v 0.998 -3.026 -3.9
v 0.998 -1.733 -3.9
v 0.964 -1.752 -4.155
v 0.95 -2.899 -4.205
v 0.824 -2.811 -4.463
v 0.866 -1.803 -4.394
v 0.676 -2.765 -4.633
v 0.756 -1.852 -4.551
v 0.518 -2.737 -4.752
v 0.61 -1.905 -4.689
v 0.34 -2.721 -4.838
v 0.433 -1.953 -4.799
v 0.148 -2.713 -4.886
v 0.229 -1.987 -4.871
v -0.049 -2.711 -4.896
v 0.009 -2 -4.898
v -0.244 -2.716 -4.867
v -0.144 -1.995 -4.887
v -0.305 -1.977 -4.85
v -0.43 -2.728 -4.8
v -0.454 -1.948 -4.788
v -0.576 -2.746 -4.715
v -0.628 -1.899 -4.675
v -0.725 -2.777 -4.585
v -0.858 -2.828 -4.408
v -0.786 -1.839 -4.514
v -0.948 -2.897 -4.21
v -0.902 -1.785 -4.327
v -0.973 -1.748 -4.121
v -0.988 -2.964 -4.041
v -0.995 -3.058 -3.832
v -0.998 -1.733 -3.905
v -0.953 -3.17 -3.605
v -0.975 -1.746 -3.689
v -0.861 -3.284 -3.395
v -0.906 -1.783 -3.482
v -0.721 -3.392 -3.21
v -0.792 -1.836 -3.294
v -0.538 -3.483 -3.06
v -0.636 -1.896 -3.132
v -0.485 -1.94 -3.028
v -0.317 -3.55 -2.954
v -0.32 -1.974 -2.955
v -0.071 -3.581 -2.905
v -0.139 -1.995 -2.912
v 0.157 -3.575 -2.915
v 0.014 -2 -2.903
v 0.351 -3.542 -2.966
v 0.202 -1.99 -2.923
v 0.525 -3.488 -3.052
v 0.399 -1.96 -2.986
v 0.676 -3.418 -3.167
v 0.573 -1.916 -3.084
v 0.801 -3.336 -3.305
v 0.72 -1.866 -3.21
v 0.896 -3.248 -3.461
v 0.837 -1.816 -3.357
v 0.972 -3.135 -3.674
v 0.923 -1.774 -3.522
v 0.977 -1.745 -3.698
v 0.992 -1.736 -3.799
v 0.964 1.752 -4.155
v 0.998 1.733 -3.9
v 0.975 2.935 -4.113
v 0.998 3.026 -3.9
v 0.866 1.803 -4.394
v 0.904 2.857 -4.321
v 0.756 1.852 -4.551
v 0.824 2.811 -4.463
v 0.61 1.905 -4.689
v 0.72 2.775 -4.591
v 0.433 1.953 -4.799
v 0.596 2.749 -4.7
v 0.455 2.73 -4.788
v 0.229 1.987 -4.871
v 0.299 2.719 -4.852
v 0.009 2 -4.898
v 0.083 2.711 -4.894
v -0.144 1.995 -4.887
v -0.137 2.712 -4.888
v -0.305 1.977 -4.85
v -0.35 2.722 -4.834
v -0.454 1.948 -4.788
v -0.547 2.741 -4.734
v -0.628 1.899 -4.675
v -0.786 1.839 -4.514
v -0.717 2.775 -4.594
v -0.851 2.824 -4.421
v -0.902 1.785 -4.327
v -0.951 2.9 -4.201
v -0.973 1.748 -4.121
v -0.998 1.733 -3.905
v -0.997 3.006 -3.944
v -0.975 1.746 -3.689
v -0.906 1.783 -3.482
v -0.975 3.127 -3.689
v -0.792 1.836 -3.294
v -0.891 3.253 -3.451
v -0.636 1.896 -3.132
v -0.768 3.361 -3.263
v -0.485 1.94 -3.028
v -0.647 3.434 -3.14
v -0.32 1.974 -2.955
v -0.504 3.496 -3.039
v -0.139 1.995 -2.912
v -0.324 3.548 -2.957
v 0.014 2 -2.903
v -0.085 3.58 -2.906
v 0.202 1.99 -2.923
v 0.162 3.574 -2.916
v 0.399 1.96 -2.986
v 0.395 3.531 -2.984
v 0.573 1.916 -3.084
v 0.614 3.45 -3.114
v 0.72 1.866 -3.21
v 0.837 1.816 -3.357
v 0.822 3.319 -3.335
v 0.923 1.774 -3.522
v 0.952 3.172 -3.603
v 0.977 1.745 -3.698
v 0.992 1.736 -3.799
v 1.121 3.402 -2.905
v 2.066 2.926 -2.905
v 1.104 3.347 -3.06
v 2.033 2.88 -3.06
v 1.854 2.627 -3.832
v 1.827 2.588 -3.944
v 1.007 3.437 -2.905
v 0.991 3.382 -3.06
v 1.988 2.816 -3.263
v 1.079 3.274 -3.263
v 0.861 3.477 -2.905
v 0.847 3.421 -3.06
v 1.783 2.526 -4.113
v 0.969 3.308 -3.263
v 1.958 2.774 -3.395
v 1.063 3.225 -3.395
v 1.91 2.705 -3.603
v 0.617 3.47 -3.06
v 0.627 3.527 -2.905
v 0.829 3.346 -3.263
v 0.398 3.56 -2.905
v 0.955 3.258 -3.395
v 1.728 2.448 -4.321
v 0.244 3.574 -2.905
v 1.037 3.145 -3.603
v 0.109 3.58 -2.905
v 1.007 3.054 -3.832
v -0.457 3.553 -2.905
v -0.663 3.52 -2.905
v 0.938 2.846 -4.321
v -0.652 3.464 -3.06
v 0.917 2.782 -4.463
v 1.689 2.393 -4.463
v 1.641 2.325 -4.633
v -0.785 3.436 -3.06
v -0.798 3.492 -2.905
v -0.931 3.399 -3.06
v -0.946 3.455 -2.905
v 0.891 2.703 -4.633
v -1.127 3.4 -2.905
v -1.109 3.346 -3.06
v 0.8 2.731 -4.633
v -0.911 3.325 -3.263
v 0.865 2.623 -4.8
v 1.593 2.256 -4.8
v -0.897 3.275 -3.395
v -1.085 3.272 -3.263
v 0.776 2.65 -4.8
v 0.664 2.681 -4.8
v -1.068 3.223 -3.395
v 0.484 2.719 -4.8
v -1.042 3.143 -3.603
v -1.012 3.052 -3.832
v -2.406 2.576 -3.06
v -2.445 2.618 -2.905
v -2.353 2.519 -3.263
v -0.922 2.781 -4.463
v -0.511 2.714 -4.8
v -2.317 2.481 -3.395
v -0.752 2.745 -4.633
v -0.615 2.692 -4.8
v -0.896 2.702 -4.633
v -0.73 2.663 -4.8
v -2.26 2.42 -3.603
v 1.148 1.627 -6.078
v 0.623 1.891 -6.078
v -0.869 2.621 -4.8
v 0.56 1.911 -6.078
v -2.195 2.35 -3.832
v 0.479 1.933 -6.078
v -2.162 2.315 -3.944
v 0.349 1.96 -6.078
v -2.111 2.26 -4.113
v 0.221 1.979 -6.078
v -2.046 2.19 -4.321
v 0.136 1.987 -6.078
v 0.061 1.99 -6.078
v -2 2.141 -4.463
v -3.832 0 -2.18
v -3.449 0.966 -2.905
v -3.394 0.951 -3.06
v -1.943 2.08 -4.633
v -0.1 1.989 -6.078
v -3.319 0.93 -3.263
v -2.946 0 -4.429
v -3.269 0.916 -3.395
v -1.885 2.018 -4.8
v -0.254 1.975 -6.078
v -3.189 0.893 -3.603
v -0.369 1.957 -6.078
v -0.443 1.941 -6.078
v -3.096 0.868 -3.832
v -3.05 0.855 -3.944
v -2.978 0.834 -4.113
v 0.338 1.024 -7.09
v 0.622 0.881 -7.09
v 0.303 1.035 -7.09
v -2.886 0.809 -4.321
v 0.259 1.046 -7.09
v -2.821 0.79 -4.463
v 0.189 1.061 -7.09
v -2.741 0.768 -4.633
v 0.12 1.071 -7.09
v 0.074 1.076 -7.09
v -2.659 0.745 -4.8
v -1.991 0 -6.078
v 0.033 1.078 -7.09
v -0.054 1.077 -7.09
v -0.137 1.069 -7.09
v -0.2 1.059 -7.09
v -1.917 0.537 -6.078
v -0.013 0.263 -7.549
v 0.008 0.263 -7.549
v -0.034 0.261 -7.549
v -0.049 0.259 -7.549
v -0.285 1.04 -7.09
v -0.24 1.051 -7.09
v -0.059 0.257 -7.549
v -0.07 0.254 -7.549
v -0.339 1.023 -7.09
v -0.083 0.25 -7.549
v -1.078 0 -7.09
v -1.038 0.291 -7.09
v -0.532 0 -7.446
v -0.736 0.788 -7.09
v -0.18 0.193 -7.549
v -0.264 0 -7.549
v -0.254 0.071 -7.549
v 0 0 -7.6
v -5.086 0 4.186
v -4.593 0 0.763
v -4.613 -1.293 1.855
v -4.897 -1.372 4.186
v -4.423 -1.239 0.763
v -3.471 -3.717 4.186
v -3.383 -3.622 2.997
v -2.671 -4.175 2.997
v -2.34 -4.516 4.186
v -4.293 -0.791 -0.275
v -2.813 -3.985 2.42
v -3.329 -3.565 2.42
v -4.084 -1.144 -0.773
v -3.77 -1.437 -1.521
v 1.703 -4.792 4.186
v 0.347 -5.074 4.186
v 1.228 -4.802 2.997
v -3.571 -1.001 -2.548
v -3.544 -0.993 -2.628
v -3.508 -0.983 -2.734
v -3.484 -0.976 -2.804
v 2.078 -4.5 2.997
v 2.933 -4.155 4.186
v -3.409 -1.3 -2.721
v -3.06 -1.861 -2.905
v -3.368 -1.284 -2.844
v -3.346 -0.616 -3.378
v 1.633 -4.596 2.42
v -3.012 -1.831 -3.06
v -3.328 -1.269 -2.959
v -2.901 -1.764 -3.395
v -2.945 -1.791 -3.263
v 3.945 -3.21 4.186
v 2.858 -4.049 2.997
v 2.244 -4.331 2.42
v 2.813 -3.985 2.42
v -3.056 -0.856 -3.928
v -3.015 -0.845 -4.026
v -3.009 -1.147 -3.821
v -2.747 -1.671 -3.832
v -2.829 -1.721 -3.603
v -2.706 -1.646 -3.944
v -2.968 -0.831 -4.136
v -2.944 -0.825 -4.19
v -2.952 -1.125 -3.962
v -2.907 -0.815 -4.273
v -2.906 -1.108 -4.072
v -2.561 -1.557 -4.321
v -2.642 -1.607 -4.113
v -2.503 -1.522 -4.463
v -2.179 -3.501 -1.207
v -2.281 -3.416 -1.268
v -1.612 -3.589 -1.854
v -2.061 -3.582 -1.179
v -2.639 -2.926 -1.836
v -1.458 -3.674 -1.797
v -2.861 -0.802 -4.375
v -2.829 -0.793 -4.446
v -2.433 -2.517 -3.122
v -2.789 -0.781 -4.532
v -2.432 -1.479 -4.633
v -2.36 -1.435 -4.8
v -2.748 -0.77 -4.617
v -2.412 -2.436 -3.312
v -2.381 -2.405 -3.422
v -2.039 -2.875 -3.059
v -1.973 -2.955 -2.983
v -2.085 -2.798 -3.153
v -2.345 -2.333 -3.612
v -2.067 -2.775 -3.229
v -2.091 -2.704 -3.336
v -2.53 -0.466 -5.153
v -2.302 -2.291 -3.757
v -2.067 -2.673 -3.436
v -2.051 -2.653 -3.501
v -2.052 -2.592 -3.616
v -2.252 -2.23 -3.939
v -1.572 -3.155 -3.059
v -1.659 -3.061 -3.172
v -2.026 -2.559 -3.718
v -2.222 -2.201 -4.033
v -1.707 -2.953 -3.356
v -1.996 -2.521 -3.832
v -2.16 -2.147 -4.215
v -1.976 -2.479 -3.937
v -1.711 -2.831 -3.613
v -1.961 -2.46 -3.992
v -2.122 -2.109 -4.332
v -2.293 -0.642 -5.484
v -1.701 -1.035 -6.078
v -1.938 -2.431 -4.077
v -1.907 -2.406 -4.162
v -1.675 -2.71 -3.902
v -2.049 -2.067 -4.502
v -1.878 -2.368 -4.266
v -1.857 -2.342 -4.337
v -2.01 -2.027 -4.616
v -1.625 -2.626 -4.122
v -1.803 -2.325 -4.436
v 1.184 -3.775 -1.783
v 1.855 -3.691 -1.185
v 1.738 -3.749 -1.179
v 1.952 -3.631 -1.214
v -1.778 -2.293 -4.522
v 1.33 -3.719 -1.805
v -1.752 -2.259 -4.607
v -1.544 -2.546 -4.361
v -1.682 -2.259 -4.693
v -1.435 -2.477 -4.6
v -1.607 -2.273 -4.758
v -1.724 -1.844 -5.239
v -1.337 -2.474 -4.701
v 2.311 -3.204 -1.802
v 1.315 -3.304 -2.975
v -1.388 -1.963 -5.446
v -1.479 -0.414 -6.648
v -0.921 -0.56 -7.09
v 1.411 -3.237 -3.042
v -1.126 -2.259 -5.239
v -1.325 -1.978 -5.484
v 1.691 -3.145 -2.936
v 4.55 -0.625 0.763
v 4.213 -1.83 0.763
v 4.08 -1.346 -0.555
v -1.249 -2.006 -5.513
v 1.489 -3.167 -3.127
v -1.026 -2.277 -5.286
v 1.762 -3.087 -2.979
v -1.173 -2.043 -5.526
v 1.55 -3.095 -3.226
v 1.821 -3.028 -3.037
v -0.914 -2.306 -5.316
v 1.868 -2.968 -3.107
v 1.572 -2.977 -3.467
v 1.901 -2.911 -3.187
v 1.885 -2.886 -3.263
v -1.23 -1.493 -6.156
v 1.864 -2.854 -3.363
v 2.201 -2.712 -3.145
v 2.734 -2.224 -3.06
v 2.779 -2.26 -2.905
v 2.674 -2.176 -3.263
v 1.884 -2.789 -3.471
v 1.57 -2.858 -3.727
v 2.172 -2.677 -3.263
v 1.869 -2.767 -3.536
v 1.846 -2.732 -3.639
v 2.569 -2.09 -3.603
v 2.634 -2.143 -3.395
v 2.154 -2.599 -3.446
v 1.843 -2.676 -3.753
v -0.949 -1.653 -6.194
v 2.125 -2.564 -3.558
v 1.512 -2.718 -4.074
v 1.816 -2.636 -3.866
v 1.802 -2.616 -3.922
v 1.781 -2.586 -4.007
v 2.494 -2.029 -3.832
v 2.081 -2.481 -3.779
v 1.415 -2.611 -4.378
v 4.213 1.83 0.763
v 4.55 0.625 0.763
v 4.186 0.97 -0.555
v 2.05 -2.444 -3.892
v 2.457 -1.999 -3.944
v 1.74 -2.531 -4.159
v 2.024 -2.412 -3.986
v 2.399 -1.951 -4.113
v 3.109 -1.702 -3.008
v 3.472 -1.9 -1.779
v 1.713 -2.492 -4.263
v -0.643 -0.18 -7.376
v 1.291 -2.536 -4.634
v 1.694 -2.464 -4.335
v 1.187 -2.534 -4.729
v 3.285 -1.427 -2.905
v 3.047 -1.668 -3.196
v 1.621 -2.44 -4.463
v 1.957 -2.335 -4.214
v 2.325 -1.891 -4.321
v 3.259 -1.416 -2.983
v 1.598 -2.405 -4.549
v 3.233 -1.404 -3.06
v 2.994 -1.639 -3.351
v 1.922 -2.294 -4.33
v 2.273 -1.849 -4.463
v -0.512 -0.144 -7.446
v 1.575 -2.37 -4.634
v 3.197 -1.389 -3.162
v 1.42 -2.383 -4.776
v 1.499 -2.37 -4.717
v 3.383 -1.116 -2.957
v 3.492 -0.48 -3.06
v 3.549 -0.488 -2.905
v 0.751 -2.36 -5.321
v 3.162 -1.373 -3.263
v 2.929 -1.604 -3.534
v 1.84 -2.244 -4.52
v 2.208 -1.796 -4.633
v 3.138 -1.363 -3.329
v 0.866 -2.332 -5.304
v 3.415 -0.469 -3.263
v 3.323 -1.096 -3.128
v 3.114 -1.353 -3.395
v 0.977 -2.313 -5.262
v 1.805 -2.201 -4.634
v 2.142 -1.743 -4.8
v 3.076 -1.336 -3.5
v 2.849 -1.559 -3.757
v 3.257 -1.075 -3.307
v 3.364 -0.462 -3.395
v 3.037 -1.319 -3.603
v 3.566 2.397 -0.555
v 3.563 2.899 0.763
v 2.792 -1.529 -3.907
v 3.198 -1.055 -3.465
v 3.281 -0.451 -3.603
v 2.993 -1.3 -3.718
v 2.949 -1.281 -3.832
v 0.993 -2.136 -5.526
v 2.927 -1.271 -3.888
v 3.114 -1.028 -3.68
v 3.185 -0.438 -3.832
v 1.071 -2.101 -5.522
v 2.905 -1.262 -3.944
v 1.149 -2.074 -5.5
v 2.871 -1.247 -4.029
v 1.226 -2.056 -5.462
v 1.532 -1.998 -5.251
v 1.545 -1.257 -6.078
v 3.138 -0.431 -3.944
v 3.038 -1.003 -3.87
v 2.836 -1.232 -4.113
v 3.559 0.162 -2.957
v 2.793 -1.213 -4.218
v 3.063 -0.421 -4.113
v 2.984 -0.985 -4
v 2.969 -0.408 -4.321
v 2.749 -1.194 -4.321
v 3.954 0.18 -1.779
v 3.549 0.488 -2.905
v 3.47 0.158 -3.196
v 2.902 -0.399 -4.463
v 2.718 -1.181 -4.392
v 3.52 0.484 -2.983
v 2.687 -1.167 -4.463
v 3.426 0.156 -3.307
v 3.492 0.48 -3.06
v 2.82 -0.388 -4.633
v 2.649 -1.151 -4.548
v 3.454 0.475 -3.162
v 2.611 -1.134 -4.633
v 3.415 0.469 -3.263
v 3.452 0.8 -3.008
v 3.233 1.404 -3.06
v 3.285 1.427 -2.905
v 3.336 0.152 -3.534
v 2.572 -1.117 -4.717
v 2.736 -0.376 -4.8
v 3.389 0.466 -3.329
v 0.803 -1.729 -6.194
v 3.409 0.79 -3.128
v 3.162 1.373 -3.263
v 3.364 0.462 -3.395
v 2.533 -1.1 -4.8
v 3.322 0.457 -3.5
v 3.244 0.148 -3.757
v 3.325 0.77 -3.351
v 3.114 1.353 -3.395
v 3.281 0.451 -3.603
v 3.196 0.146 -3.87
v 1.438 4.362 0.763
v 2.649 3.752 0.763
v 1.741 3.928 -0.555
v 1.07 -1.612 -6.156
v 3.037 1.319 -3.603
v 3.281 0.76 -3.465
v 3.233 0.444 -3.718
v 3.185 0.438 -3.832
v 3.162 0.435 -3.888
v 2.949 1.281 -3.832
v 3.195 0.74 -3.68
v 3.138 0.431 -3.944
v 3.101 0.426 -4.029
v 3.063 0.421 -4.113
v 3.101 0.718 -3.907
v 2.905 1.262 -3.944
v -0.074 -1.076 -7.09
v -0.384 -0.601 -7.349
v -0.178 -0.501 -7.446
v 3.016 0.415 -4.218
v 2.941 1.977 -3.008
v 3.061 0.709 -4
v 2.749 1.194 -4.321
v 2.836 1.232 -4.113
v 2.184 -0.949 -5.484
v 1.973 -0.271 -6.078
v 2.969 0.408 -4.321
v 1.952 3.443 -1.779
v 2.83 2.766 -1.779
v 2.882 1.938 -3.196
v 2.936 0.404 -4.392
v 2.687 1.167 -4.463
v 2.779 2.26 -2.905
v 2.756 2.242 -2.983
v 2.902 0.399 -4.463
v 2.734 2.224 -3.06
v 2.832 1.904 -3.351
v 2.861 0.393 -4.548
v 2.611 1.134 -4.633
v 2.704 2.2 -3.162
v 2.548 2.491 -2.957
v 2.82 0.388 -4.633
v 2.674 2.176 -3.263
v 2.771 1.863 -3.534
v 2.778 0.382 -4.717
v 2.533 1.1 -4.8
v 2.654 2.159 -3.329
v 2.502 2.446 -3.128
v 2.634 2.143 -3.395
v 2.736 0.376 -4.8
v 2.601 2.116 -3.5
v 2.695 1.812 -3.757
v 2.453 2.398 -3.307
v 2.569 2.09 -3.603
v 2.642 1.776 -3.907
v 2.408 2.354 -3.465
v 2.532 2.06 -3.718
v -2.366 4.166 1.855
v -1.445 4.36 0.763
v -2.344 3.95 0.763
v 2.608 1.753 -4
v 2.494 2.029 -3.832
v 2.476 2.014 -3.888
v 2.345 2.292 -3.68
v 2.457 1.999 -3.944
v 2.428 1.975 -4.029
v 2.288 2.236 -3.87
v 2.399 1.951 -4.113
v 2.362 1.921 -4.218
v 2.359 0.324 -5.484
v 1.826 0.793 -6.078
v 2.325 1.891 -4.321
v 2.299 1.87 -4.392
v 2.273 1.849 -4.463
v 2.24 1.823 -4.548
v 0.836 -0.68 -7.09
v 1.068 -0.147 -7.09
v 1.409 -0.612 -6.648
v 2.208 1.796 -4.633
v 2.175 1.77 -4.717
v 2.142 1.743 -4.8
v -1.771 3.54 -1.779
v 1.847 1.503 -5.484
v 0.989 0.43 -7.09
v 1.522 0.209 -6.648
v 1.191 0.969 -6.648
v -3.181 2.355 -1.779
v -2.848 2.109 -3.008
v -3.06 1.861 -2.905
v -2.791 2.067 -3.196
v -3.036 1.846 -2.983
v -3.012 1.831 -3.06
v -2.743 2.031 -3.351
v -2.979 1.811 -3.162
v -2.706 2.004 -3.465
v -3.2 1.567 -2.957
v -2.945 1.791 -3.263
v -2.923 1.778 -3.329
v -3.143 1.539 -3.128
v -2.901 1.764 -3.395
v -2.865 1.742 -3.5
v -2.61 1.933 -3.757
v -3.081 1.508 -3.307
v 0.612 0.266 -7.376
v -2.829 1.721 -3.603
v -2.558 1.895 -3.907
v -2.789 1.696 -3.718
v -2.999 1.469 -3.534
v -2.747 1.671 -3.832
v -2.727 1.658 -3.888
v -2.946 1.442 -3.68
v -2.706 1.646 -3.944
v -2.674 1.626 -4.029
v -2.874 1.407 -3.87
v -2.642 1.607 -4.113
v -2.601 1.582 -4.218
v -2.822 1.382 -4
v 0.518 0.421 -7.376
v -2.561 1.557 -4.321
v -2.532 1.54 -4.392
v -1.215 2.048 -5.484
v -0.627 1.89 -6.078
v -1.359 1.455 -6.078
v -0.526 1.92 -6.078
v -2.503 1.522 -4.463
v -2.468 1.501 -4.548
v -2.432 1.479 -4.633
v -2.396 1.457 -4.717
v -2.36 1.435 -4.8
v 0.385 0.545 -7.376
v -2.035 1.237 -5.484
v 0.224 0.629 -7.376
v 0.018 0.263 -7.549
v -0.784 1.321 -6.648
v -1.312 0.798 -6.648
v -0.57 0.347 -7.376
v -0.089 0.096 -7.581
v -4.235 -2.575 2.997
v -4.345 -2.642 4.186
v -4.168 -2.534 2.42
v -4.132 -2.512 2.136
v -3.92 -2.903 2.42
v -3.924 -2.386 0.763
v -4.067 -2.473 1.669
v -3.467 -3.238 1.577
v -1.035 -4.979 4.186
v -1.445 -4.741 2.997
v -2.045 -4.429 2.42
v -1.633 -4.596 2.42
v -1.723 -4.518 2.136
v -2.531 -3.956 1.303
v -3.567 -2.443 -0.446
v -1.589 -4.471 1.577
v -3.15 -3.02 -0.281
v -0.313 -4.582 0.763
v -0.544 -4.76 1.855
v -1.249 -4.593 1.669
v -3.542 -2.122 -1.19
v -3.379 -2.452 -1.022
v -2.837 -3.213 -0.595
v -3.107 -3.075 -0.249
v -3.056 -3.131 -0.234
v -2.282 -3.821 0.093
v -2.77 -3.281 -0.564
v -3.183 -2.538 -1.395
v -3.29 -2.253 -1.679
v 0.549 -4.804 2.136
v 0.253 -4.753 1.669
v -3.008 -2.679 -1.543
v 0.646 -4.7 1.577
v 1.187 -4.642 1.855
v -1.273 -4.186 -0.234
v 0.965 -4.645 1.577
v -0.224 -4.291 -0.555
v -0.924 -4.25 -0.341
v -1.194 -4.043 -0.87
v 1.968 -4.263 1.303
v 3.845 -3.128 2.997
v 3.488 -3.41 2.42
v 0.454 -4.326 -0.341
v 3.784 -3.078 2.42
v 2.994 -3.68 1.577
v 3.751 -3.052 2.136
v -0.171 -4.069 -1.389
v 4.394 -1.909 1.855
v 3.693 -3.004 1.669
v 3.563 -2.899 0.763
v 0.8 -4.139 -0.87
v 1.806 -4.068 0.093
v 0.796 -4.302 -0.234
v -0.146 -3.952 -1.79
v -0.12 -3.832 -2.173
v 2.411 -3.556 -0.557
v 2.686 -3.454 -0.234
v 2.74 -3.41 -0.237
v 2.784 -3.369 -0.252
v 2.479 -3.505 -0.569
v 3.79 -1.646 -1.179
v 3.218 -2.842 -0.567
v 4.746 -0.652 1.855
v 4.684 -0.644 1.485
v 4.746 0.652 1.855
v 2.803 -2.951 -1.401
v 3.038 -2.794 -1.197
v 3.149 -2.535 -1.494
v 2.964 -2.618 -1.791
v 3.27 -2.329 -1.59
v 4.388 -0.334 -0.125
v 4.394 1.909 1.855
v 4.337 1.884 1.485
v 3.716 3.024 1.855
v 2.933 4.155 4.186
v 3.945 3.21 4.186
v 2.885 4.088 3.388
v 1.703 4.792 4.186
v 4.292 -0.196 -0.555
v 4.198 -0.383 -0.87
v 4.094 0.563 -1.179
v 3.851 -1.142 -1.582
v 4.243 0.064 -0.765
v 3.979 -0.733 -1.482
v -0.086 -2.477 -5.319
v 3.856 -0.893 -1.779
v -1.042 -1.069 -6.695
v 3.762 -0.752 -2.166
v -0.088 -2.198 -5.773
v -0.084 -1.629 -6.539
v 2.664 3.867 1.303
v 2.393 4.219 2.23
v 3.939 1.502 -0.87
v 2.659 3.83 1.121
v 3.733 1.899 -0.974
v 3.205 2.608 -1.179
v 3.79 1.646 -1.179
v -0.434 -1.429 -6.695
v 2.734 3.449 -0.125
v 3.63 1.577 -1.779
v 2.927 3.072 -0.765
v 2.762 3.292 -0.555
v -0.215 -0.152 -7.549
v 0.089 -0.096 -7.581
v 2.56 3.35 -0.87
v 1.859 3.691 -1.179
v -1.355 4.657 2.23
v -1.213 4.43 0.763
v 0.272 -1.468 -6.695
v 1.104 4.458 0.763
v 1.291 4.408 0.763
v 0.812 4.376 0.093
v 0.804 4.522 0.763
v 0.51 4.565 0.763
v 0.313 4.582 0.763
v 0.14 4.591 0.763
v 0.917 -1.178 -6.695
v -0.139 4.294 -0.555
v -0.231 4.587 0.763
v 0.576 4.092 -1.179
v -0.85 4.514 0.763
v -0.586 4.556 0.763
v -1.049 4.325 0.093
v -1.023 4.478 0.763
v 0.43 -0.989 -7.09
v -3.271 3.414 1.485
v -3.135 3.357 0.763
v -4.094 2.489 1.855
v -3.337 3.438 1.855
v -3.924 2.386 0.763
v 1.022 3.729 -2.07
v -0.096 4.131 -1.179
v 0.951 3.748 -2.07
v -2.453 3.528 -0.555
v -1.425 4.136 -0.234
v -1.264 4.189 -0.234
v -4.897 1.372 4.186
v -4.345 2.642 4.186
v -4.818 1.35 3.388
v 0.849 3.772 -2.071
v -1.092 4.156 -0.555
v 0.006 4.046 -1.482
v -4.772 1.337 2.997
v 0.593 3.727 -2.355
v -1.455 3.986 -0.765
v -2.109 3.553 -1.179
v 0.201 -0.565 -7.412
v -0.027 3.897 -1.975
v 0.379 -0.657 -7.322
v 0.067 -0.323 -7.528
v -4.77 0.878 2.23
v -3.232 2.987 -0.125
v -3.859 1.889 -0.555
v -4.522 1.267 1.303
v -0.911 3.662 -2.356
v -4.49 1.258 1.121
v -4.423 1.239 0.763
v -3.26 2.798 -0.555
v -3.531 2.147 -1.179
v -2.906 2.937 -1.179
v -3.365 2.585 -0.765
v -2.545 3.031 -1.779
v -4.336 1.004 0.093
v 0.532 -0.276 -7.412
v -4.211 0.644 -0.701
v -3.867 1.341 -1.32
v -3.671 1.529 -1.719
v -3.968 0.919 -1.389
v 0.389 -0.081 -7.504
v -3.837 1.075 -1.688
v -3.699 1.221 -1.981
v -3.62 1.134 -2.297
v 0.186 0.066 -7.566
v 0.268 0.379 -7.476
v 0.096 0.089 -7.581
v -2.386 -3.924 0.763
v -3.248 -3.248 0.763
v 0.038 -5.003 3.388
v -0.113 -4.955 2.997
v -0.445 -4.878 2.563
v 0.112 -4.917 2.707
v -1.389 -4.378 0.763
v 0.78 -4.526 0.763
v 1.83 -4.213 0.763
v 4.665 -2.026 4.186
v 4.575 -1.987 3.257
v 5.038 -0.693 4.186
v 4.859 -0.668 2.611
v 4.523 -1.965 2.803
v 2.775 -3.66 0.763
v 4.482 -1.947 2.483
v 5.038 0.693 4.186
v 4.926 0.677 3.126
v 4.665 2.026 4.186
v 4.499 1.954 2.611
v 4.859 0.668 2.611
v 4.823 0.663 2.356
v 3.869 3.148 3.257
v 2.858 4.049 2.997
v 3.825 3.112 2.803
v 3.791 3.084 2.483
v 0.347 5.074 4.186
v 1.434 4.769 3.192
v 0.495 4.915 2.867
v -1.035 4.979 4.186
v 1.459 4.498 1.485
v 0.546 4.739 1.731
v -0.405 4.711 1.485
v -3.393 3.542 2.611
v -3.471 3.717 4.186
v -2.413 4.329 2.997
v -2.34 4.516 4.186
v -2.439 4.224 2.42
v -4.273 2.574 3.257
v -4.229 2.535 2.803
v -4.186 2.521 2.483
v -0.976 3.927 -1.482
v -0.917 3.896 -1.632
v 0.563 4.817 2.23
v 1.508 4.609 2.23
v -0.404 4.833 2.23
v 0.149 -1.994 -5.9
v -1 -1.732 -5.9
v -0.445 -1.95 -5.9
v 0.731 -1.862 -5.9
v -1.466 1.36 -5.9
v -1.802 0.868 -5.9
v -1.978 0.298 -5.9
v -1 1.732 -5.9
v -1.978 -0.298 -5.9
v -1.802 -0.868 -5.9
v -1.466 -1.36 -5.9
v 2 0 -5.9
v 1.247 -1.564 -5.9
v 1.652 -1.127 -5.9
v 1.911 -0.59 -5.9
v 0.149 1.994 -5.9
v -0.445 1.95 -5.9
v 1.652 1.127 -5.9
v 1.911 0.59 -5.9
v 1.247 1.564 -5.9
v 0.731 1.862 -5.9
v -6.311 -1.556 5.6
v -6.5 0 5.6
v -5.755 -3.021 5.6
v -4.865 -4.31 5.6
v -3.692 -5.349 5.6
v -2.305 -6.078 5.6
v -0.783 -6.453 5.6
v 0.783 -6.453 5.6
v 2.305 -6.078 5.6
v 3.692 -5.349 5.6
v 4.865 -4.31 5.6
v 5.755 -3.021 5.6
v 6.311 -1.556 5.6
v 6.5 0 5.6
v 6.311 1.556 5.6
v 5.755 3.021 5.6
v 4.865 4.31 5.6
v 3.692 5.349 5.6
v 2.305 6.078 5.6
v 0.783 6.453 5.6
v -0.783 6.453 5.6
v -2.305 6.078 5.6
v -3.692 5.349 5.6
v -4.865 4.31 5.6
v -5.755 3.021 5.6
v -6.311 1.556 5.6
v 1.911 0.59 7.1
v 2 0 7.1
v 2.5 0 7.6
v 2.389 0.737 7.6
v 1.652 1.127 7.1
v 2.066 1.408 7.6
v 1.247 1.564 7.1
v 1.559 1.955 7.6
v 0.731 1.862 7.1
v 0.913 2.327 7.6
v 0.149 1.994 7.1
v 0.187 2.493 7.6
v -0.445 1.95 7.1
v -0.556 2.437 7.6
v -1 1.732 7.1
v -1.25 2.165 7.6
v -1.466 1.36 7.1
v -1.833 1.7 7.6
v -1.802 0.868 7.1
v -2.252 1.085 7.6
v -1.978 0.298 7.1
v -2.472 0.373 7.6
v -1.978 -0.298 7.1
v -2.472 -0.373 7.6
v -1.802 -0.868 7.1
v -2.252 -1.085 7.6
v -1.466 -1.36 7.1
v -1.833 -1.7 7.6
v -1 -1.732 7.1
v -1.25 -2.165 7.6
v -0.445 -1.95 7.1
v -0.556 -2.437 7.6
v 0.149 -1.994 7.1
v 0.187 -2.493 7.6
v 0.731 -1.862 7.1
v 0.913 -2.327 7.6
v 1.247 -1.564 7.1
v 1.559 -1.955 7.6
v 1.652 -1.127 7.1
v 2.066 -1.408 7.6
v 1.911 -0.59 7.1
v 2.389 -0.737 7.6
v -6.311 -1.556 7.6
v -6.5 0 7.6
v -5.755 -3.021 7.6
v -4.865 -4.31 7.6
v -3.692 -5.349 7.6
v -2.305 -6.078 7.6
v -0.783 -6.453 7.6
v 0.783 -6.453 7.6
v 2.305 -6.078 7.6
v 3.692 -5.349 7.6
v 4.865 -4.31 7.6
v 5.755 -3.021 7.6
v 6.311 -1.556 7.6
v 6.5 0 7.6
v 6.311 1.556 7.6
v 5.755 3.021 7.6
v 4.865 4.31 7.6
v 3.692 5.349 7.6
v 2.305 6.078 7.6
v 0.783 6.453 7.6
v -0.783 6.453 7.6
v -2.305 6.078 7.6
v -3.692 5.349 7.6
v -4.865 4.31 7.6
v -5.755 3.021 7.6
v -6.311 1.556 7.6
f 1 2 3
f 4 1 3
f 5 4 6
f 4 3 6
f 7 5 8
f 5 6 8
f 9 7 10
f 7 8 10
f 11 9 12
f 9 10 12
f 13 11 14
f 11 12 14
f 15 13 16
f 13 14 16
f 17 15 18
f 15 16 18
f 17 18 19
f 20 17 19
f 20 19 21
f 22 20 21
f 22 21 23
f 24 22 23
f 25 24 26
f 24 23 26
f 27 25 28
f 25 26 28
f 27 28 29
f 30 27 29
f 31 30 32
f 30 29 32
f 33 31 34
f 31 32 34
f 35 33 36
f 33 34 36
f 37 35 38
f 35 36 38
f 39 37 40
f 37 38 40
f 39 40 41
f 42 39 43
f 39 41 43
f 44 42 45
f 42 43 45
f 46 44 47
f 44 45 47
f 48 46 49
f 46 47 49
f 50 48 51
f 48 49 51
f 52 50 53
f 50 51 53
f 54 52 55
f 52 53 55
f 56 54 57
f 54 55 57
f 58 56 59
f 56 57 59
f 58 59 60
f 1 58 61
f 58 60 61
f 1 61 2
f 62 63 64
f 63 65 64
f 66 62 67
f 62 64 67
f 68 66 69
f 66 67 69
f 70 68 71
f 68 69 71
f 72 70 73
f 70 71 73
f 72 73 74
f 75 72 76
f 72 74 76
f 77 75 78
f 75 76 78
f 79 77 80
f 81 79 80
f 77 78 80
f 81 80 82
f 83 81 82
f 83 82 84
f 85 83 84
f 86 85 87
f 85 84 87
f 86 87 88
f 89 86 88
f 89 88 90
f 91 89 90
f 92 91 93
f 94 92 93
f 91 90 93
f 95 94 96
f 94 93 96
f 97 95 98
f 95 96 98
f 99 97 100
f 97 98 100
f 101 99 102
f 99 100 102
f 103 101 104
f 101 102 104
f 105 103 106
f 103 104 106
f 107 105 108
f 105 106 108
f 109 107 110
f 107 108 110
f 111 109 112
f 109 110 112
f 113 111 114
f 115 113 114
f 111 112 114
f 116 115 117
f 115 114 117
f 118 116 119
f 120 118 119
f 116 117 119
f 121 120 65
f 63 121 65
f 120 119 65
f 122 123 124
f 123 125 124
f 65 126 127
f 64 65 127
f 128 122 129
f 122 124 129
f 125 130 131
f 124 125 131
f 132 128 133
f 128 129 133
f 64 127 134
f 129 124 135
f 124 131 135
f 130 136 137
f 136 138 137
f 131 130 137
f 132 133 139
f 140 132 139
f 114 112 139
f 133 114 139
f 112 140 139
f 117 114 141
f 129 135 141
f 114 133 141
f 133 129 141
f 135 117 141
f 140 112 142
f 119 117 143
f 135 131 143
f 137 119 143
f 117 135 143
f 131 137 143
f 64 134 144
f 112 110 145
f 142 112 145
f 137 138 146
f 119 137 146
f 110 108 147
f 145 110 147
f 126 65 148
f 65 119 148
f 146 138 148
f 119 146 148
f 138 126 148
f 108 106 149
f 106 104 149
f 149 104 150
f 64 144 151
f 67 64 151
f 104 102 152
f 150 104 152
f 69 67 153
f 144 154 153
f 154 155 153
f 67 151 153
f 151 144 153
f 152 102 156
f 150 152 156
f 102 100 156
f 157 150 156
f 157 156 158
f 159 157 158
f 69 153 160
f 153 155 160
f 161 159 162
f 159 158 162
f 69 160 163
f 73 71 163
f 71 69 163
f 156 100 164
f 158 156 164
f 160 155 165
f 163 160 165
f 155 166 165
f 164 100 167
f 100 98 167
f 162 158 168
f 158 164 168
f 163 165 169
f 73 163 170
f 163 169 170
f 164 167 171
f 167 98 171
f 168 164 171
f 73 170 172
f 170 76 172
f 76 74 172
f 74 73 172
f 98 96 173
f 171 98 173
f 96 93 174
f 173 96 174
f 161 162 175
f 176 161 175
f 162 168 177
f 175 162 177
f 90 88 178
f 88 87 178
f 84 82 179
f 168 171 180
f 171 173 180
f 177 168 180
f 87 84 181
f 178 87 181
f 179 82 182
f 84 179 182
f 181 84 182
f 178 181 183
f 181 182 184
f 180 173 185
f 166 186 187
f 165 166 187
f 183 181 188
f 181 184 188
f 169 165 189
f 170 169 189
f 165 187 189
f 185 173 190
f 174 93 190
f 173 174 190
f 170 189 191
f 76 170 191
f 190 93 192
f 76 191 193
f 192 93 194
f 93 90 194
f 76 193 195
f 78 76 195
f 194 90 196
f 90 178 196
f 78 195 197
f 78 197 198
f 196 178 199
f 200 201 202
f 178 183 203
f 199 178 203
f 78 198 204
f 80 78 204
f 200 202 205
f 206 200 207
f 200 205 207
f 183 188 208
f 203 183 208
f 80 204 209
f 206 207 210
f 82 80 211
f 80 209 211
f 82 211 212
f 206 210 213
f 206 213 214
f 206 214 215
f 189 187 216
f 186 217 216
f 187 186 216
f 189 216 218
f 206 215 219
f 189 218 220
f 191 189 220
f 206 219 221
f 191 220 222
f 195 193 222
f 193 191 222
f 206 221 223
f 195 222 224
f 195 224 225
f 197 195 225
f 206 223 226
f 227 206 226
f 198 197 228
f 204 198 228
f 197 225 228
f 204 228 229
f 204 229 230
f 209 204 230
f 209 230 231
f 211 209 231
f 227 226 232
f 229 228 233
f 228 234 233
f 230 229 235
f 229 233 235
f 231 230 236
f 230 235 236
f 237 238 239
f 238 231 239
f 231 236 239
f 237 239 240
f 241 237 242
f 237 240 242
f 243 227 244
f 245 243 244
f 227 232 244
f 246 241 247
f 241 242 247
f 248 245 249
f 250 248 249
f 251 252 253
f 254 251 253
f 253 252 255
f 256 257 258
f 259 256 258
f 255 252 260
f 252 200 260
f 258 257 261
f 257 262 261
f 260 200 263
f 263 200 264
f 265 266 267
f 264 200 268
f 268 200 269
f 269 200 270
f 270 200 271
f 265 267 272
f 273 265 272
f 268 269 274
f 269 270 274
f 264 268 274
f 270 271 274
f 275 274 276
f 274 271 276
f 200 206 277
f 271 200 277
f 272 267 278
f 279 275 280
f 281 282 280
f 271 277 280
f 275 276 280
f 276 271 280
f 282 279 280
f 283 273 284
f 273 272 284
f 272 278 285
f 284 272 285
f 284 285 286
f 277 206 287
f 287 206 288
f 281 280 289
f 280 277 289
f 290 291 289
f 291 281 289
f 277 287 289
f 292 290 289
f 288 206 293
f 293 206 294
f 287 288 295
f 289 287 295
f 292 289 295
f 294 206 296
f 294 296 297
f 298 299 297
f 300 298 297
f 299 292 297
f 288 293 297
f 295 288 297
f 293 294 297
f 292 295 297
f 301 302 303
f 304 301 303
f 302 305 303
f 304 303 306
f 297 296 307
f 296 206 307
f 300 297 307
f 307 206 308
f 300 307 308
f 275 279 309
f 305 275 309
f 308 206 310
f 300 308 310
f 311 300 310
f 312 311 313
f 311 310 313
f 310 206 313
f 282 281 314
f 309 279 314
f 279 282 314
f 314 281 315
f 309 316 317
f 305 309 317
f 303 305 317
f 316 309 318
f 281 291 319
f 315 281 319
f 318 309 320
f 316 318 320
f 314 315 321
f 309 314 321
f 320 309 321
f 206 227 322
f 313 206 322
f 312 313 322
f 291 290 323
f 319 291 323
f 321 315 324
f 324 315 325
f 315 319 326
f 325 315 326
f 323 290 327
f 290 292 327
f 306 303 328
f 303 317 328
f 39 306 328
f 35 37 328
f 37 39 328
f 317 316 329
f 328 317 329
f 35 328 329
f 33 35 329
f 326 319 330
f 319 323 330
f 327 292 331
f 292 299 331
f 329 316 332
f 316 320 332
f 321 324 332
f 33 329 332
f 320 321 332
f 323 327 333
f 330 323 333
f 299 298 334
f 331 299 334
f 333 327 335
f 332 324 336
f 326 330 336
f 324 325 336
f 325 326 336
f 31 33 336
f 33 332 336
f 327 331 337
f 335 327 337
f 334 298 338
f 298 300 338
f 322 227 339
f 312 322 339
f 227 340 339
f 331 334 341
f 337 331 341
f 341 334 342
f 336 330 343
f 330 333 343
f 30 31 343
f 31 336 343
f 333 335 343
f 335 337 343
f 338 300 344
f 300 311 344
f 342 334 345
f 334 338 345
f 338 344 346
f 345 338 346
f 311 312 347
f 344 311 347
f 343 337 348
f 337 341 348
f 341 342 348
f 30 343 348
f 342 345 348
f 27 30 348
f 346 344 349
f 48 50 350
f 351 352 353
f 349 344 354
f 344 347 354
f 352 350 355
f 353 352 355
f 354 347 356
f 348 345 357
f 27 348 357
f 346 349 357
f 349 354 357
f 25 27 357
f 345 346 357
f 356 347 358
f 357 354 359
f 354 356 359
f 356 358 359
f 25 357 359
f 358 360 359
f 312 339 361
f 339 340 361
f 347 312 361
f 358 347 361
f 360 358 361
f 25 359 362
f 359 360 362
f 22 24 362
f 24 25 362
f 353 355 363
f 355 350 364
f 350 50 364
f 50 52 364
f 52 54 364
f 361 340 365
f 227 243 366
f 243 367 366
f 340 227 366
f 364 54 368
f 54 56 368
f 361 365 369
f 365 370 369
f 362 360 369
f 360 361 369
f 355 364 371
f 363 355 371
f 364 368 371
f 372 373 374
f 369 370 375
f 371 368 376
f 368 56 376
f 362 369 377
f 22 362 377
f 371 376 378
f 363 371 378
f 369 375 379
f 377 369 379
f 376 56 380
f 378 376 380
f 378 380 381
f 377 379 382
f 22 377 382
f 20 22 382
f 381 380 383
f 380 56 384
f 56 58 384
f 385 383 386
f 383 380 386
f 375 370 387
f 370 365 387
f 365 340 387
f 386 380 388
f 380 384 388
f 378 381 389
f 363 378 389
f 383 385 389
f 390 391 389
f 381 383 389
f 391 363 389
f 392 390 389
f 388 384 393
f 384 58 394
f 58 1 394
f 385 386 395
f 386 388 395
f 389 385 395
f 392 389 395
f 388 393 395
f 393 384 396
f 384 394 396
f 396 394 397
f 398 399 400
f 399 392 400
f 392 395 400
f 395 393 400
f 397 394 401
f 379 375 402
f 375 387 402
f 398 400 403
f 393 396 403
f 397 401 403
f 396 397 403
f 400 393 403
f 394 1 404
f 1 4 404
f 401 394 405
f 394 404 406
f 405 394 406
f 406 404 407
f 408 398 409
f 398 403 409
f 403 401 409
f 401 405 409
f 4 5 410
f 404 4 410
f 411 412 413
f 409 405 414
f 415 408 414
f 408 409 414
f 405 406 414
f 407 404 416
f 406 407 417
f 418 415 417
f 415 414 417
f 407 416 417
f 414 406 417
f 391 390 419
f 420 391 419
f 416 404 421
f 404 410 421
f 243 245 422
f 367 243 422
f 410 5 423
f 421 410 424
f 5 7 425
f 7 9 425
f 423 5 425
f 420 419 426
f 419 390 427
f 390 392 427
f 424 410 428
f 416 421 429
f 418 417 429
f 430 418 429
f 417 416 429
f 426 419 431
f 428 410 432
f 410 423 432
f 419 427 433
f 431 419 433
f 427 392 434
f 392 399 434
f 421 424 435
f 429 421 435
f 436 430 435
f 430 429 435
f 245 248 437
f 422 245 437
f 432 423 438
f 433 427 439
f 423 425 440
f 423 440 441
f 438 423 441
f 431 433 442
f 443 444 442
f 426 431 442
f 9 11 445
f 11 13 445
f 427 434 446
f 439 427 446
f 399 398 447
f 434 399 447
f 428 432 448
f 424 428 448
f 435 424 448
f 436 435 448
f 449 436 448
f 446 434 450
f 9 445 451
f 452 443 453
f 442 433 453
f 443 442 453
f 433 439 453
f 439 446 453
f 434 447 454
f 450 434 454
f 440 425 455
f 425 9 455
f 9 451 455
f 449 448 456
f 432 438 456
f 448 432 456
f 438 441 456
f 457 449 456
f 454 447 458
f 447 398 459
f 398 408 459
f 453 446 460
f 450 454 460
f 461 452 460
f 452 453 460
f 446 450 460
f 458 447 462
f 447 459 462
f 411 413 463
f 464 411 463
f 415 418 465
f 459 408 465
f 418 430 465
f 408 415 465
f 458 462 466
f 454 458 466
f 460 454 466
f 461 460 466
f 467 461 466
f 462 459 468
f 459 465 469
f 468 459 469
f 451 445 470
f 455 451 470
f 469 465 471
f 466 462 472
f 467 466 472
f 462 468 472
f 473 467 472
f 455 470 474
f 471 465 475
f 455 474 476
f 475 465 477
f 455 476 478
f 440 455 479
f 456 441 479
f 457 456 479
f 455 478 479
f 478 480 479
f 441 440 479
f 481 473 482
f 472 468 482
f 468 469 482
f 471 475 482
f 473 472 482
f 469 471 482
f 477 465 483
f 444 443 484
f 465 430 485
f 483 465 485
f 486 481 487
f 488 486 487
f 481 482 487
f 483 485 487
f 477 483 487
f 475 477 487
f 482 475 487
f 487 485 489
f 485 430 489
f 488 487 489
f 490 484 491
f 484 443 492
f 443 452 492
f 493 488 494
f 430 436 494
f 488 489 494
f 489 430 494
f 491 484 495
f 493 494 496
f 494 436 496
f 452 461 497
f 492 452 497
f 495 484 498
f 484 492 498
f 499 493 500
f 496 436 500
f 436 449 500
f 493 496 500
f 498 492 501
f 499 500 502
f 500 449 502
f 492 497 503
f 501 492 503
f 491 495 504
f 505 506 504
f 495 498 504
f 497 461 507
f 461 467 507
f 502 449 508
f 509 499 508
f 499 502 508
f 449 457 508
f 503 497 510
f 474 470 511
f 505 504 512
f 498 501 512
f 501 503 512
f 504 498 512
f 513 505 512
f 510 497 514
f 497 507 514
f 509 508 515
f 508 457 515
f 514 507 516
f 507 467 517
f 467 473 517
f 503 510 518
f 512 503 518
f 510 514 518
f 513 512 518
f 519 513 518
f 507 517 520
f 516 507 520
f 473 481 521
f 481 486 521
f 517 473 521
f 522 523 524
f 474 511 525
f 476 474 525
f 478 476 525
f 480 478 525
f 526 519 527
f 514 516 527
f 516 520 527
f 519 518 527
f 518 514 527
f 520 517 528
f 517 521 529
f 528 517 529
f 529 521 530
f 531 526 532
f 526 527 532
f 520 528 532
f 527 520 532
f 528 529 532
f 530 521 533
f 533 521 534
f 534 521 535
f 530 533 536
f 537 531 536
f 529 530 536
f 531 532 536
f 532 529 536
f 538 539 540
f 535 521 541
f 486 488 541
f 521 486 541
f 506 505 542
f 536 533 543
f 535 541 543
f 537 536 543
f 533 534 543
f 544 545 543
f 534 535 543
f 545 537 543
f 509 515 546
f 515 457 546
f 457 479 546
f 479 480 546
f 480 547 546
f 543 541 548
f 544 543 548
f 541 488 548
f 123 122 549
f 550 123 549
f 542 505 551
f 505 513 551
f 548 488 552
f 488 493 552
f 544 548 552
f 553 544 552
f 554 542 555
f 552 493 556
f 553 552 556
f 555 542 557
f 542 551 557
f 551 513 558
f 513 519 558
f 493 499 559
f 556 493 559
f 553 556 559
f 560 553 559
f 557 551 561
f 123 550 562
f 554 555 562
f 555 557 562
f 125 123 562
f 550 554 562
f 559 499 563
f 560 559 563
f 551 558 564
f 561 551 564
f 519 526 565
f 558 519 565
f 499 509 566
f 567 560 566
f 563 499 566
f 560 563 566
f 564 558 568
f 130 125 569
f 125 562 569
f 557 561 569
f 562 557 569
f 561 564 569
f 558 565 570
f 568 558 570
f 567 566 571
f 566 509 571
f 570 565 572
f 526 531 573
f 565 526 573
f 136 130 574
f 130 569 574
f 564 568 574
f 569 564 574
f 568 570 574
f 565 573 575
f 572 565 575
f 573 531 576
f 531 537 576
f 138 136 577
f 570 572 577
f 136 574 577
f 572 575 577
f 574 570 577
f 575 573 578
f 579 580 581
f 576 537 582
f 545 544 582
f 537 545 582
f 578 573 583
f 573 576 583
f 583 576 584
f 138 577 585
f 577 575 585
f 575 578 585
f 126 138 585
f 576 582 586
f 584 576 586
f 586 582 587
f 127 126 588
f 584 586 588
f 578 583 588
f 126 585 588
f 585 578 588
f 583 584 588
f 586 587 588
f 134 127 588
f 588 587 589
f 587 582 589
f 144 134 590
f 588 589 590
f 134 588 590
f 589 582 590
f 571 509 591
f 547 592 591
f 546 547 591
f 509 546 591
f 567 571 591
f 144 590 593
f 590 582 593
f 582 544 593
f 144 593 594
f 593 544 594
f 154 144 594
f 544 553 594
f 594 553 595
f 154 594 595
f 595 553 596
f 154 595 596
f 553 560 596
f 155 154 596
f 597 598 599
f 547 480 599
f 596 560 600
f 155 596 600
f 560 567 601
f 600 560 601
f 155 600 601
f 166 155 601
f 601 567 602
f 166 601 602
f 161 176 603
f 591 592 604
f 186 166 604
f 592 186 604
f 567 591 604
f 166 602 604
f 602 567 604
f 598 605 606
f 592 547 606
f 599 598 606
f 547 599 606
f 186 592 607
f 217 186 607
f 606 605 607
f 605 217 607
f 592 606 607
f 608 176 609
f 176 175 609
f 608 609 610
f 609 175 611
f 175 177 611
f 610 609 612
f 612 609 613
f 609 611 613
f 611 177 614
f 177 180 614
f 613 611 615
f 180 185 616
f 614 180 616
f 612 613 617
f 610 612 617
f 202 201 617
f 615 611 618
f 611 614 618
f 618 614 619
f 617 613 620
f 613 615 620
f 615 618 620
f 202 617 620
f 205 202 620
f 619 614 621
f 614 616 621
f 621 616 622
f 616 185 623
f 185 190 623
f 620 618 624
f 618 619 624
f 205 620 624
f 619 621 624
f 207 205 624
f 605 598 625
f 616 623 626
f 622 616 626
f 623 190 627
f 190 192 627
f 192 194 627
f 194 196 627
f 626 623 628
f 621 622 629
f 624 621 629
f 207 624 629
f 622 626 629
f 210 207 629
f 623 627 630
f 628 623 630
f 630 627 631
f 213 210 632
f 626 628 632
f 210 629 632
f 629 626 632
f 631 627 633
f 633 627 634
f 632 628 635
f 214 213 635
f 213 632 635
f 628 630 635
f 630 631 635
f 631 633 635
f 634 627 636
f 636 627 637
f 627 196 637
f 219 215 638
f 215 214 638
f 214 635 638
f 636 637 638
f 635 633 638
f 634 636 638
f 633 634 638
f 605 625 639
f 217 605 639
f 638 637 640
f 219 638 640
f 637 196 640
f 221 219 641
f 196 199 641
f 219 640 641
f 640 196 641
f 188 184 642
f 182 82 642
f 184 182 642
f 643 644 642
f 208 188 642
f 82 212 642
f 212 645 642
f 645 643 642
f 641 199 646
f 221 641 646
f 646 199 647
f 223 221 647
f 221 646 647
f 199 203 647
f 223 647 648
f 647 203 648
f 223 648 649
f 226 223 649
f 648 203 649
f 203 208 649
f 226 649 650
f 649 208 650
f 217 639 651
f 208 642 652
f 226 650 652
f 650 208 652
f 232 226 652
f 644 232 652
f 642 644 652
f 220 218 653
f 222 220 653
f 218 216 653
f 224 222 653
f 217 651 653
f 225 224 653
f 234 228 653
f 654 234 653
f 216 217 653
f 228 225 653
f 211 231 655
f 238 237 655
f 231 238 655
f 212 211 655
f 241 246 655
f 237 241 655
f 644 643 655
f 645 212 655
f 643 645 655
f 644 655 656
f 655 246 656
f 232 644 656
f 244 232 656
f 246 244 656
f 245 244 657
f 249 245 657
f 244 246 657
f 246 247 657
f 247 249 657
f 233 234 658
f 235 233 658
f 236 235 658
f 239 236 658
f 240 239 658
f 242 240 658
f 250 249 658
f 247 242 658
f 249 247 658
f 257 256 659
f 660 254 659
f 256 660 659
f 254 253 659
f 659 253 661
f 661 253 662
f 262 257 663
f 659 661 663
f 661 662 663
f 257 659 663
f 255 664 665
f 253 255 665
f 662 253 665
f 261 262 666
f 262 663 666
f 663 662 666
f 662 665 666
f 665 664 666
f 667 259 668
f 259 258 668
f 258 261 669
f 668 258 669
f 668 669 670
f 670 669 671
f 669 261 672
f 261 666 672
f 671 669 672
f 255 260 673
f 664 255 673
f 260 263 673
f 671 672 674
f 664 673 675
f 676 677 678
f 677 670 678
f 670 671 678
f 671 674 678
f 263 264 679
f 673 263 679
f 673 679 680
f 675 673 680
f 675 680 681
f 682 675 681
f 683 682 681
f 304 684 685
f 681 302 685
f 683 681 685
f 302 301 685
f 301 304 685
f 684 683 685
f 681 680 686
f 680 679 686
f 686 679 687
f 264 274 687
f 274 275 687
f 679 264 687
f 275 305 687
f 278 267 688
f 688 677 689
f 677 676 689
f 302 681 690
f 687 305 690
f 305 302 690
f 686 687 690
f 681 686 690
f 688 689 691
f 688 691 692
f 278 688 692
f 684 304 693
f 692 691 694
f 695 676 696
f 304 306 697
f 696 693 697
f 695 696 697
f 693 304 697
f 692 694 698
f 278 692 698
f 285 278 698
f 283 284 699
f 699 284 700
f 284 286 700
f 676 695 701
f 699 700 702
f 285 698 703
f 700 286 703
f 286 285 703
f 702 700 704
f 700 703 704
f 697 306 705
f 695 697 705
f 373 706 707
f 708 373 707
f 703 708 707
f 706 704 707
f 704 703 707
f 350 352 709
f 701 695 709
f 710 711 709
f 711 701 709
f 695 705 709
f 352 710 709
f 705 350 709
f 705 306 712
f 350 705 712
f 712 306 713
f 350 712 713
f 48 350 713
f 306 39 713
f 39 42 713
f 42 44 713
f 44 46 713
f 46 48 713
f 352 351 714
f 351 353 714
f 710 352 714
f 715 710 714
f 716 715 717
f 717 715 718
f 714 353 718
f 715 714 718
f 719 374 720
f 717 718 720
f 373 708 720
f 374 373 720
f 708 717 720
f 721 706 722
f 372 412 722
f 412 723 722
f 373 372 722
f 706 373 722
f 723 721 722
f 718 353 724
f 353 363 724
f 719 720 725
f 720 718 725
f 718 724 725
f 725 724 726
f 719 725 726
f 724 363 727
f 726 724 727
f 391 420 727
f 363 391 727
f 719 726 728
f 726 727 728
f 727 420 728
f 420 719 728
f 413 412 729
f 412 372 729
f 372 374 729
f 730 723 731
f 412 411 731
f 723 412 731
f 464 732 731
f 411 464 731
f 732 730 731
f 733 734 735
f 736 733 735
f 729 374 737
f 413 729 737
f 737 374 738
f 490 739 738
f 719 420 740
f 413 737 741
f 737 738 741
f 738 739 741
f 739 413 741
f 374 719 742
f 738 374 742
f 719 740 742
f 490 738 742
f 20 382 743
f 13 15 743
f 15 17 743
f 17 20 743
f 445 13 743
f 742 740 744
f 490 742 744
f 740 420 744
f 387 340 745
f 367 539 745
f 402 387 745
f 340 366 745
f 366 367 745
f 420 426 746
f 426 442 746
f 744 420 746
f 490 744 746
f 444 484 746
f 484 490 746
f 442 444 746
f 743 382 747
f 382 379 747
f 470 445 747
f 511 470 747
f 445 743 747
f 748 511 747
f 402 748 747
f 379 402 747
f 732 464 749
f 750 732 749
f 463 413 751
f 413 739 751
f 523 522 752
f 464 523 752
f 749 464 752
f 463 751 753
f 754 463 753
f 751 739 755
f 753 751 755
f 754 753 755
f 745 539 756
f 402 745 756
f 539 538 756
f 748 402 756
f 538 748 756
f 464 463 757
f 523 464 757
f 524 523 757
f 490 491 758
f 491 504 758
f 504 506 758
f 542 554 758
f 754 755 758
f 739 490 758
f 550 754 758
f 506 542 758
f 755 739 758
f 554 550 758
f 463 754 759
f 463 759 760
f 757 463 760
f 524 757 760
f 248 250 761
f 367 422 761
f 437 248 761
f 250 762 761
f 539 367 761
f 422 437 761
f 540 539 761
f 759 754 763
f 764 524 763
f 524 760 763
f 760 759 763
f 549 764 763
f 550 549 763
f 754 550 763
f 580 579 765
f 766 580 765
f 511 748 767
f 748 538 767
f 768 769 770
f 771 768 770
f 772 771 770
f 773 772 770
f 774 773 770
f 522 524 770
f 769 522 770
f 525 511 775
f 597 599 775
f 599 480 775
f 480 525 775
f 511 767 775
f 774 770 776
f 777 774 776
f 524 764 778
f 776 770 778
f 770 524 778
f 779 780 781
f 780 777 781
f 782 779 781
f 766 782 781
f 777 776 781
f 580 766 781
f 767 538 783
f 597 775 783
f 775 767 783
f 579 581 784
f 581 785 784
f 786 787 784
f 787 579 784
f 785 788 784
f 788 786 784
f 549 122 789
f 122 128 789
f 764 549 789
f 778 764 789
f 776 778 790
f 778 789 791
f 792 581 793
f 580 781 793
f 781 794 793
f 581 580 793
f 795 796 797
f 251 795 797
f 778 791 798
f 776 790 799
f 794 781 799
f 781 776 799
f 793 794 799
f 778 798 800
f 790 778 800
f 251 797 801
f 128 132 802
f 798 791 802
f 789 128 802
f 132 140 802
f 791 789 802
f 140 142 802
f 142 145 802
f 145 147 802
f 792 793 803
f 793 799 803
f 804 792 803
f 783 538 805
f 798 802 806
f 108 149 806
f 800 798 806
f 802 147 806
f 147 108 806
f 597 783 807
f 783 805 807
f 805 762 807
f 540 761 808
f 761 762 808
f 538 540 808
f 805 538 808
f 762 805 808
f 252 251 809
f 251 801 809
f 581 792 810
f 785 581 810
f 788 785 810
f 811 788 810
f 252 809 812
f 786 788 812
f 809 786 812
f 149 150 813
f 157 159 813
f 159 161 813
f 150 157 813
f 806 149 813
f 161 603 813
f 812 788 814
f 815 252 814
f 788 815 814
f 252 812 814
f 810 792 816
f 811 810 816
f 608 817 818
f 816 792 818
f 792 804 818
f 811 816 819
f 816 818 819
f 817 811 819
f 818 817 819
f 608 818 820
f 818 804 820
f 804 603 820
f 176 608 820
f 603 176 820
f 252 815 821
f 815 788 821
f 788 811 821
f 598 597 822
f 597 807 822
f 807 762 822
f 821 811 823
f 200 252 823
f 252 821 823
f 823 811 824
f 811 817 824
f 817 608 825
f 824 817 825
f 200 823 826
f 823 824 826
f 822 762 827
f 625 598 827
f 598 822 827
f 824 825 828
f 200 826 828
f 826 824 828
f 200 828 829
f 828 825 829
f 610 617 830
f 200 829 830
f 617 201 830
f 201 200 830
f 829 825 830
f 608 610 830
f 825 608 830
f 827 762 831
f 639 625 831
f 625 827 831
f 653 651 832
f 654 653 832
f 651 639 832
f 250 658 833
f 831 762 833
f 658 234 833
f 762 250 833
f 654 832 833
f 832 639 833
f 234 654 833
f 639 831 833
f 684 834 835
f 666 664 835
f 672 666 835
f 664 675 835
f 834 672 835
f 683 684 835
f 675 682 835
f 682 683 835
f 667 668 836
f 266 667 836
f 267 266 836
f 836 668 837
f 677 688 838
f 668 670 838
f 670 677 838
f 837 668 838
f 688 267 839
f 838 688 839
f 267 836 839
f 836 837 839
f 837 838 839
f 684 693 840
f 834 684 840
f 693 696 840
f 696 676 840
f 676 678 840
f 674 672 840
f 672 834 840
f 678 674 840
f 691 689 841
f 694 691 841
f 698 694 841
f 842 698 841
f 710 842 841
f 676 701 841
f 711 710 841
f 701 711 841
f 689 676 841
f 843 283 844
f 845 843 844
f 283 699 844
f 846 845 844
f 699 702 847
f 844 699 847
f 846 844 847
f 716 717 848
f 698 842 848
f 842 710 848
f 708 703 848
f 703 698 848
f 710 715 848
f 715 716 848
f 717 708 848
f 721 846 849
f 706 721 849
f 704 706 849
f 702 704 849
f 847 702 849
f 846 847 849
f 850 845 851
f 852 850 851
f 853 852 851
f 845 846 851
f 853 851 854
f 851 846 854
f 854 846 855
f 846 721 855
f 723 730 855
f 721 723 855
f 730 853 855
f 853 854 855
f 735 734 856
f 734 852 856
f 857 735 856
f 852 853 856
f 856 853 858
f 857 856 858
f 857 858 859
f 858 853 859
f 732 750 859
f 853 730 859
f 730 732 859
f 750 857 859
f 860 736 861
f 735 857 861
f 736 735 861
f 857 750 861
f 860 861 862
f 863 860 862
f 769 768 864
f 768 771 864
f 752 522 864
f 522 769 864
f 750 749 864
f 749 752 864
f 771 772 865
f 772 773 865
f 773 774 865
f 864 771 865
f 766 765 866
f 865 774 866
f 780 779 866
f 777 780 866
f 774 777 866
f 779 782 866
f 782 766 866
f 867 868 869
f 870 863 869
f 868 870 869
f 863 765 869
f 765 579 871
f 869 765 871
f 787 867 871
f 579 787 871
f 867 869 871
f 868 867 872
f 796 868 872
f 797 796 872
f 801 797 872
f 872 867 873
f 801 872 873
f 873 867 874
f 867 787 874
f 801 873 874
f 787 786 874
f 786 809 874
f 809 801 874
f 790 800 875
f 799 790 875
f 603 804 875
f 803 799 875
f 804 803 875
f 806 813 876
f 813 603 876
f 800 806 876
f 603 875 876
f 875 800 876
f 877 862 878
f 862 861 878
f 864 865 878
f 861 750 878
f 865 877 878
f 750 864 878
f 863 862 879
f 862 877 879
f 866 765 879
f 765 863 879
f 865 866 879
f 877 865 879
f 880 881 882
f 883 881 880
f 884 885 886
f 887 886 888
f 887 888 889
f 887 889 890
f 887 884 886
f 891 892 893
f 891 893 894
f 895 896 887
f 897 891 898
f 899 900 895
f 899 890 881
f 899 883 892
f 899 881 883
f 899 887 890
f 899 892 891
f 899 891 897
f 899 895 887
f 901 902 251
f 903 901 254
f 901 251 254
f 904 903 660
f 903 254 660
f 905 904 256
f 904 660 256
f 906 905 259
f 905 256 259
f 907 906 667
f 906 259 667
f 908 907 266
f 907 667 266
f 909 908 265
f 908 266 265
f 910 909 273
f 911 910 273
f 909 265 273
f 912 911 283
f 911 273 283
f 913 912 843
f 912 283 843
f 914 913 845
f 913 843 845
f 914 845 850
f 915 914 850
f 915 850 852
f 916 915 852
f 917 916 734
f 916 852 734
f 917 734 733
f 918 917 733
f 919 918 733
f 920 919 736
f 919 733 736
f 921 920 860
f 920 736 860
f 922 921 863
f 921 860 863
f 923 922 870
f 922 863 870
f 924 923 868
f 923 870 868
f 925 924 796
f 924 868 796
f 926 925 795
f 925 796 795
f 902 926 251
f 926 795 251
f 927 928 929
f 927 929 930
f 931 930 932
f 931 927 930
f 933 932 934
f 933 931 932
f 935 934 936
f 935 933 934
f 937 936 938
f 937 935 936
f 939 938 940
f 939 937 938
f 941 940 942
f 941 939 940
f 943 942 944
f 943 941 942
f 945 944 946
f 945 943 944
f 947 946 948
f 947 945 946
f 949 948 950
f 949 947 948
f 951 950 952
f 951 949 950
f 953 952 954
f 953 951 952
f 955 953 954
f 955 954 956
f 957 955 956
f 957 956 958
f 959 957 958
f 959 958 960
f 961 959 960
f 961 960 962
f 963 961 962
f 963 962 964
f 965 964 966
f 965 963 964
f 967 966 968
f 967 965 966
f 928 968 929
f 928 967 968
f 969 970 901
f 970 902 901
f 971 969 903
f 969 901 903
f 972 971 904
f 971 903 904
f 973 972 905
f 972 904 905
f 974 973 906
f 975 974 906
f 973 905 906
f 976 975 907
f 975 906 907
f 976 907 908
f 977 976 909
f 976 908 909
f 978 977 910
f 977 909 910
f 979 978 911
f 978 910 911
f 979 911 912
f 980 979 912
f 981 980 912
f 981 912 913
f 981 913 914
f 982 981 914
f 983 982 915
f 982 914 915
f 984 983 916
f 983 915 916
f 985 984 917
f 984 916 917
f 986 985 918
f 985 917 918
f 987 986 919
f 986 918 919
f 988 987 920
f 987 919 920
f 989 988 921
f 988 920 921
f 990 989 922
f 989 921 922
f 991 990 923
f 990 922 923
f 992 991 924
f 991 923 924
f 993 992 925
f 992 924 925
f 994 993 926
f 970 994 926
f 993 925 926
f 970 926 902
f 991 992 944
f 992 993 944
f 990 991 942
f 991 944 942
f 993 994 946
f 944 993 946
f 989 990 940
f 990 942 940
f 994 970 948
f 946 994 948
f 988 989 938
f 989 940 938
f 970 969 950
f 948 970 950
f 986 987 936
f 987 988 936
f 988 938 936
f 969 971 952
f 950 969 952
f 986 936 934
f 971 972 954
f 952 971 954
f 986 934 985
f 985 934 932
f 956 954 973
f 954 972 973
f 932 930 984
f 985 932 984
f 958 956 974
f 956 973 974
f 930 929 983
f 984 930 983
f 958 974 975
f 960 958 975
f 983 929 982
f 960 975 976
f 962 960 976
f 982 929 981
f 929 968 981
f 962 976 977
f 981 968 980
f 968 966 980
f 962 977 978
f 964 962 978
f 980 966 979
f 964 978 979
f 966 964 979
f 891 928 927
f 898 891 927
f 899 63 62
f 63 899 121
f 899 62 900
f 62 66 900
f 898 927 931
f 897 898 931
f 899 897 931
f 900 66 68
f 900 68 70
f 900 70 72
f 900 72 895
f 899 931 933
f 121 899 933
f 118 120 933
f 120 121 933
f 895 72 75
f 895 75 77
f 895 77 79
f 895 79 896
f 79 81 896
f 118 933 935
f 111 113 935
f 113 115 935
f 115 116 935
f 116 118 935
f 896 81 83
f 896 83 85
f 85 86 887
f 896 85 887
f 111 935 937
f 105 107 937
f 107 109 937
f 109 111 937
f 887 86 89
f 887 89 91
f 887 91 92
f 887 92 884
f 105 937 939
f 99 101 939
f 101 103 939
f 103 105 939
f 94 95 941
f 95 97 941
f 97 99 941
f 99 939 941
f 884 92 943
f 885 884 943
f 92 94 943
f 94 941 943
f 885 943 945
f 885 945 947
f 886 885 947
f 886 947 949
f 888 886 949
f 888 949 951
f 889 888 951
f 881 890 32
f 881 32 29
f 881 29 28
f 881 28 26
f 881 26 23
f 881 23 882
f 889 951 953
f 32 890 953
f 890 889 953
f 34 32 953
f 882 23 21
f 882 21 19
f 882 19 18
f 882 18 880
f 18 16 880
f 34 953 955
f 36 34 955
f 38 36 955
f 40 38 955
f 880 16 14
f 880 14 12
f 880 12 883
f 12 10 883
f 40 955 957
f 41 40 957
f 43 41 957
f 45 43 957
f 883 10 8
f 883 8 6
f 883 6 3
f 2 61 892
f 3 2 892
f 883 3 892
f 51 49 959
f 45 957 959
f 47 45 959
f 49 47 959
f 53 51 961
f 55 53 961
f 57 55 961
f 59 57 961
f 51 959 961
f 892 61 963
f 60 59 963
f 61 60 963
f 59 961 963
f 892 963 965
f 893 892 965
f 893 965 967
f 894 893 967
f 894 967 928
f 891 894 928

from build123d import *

# Parameters (mm, degrees)
CROQUIS2_R            = 0.99756867
CORTAR_EXTRUIR1_DEPTH = 5
CROQUIS4_R            = 2
CORTAR_EXTRUIR2_DEPTH = 13.5
CHAFL_N1_SIZE         = 0.5


with BuildPart() as part:
    # Croquis1 → Revolución1 (revolve)
    with BuildSketch(Plane(origin=(0, 0, 0), x_dir=(1, 0, 0), z_dir=(0, 1, 0))):
        with BuildLine():
            Line((0, -7.6), (-6.5, -7.6))
            Line((-6.5, -7.6), (-6.5, -5.6))
            Line((-6.5, -5.6), (-5.085786438, -4.185786438))
            add(Edge.make_bspline(
                [(-5.085786438, -4.185786438), (-4.45743914, 2.686299208), (-1.971742684, 7.41138075), (0, 7.6)],
                knots=[0, 0, 0, 0, 1, 1, 1, 1], degree=3))
            Line((0, 7.6), (0, -7.6))
        make_face()
    revolve(axis=Axis((0, 0, -14.344827586), (0, 0, 1)))

    # Croquis2 → Cortar-Extruir1 (cut, symmetric)
    with BuildSketch(Plane(origin=(0, 0, 0), x_dir=(1, 0, 0), z_dir=(0, 1, 0))):
        with Locations((0, 3.9)):
            Circle(CROQUIS2_R)
    extrude(amount=CORTAR_EXTRUIR1_DEPTH, both=True, mode=Mode.SUBTRACT)

    # Croquis4 → Cortar-Extruir2 (cut)
    with BuildSketch(Plane.XY.offset(7.6)):
        Circle(CROQUIS4_R)
    extrude(amount=-CORTAR_EXTRUIR2_DEPTH, mode=Mode.SUBTRACT)

    # Chaflán1
    chafl_n1_edges = [part.edges().sort_by_distance(p)[0] for p in [
        (-2, 0, 7.6),
    ]]
    chamfer(chafl_n1_edges, length=CHAFL_N1_SIZE)


solid = part.part
